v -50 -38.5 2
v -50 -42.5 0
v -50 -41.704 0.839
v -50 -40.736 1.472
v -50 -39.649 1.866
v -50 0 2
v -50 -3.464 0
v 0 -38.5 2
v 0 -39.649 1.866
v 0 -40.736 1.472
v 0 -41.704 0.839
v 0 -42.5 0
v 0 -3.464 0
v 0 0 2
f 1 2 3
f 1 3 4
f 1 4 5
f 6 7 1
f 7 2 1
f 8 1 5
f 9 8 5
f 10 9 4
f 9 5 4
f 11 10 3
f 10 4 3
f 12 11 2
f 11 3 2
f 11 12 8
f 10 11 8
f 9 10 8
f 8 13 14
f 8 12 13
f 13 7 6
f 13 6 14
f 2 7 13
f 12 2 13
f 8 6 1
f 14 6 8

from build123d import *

# Parameters (mm, degrees)
F0_W        = 50
F0_H        = 42.5
F1_DEPTH    = 2
F2_SIZE2    = 3.464092
F2_SIZE     = 1.99999
F3_T1_DEPTH = 70


# Not quite as in the source:
# - a fillet or chamfer that OpenCascade refuses, or shapes differently, is made with other operations: its cross-section is extruded or revolved along the edge and cut away or added
# - a fillet or chamfer is up to 0.001 mm smaller than in the source, because OpenCascade refuses the exact size


with BuildPart() as f1:
    # F0 (on Top) → F1 (new body)
    with BuildSketch(Plane.XY):
        with Locations((-25, -21.25)):
            Rectangle(F0_W, F0_H)
    extrude(amount=F1_DEPTH)

    # F2 (size 2 and 3.4641016151 in the source; OpenCascade refuses exactly that, so slightly less here)
    f2_edges = [f1.edges().sort_by_distance(p)[0] for p in [
        (-25, 0, 0),
    ]]
    f2_side = f1.faces().sort_by_distance((-25, 0, 1))[0]
    chamfer(f2_edges, length=F2_SIZE, length2=F2_SIZE2, reference=f2_side)

    # F3: fillet of radius 5 on 1 edges, made by hand

    # F3_s2 → F3_t1 (cut)
    with BuildSketch(Plane.YZ.offset(-60)):
        with BuildLine():
            ThreePointArc((-38.5, 2), (-40.7360679775, 1.472135955), (-42.5, 0))
            Line((-42.5, 0), (-42.5, 2))
            Line((-42.5, 2), (-38.5, 2))
        make_face()
    extrude(amount=F3_T1_DEPTH, mode=Mode.SUBTRACT)


solid = f1.part
